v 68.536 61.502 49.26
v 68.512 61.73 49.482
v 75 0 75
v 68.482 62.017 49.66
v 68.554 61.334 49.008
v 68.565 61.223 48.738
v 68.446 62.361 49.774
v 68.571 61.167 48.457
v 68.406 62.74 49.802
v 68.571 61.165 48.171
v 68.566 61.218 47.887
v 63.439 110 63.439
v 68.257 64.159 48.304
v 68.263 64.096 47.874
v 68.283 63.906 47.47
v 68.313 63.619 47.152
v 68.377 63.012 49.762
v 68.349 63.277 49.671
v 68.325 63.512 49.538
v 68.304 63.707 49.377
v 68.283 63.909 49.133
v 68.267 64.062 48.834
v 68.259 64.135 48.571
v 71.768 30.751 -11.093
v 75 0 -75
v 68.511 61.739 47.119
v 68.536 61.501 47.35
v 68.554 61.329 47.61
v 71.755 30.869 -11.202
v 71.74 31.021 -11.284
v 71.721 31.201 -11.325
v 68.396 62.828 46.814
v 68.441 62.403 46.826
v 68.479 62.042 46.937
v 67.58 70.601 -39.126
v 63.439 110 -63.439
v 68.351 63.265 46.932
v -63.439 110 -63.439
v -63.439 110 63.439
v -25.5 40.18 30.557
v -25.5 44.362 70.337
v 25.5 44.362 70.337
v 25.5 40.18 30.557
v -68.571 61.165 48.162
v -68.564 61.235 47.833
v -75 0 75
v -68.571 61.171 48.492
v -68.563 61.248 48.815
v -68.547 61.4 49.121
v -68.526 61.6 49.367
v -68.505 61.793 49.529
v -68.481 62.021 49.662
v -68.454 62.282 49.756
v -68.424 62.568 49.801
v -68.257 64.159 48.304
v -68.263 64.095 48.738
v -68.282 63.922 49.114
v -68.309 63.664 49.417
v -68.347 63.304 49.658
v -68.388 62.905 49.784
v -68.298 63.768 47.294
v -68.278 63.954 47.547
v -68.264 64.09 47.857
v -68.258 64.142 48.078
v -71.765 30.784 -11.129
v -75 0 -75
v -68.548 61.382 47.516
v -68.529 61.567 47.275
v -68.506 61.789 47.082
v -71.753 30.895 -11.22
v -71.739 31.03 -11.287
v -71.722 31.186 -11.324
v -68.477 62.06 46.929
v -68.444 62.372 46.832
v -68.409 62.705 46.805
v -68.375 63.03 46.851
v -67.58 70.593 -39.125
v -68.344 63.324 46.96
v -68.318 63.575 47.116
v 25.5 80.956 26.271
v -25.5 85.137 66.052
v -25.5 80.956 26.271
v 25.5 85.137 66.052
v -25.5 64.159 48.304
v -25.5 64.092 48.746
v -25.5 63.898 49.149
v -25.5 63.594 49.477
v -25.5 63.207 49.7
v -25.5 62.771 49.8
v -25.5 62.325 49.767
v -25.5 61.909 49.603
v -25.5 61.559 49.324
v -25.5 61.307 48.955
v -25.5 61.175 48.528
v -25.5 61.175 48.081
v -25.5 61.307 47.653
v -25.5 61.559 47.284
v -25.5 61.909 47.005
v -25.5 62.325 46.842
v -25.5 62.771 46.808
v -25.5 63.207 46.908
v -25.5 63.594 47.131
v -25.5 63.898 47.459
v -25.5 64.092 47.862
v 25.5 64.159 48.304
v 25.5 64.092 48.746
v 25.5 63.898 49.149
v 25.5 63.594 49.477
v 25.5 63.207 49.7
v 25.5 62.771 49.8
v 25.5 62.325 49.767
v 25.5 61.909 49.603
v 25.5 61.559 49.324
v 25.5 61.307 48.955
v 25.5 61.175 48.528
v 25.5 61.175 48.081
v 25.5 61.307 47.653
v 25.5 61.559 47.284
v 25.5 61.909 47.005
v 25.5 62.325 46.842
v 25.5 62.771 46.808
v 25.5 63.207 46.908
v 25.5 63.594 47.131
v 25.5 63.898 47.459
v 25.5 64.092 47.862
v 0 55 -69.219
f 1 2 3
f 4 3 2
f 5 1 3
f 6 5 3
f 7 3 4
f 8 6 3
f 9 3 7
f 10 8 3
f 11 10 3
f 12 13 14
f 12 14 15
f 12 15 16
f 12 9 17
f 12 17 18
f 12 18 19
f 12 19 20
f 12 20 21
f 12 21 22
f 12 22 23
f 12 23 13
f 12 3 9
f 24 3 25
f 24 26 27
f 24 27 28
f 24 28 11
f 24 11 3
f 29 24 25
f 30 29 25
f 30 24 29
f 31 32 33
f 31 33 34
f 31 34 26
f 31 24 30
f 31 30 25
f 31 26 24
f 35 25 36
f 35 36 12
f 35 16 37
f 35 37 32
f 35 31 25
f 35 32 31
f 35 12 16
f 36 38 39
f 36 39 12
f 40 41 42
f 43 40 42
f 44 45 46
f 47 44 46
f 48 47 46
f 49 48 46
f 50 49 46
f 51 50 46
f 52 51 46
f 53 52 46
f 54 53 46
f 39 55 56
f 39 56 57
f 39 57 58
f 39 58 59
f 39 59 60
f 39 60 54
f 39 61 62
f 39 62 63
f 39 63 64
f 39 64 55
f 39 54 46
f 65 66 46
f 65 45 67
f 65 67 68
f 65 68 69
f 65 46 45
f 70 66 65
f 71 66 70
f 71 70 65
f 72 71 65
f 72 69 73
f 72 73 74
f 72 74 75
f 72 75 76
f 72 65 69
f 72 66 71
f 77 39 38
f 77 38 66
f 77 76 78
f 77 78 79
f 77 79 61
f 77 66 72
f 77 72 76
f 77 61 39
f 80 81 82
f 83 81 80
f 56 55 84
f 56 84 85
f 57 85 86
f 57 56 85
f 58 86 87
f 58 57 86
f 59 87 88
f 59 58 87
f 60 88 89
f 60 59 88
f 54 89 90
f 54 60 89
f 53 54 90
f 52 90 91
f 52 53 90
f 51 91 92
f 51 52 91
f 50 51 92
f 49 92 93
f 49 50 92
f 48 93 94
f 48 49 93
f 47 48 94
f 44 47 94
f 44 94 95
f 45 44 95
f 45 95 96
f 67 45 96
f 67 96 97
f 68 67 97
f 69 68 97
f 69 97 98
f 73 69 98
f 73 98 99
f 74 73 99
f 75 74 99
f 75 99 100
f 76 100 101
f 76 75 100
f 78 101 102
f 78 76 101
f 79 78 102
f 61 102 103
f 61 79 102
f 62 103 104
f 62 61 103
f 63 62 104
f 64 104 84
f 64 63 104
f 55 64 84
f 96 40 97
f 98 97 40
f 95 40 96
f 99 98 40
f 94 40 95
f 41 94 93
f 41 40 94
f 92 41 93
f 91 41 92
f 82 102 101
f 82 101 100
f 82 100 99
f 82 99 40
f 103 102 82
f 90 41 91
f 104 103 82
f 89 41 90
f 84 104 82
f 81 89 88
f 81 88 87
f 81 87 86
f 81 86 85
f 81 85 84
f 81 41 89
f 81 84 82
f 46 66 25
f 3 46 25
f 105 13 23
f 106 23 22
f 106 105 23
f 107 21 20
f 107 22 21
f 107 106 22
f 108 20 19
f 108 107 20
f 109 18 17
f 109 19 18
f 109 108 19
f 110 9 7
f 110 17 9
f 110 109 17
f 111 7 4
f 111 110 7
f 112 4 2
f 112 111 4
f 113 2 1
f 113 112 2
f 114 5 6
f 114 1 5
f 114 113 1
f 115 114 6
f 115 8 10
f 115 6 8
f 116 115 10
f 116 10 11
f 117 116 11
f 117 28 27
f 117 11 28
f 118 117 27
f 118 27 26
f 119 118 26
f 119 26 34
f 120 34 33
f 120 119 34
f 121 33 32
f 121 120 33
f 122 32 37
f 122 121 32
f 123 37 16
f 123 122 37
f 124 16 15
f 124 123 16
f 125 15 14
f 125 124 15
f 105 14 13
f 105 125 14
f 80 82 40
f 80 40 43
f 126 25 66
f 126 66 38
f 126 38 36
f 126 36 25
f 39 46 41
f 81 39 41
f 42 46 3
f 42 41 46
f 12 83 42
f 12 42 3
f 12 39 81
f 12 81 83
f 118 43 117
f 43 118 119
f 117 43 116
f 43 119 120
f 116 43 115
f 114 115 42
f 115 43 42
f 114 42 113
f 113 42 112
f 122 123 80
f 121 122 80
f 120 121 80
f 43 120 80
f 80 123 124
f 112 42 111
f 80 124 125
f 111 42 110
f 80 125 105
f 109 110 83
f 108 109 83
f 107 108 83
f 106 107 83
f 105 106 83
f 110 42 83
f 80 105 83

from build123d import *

# Parameters (mm, degrees)
SKETCH1_W               = 150
SKETCH1_H               = 150
BOSS_EXTRUDE1_DEPTH     = 110
BOSS_EXTRUDE1_TAPER     = 6
SKETCH14_W              = 51
SKETCH14_H              = 41
CUT_EXTRUDE2_DEPTH      = 40
CUT_EXTRUDE3_DEPTH      = 167.809022709
CUT_EXTRUDE3_DEPTH_BACK = 167.809022709
SKETCH23_R              = 1.5


with BuildPart() as part:
    # Sketch1 → Boss-Extrude1 (new body)
    with BuildSketch(Plane(origin=(0, 0, 0), x_dir=(1, 0, 0), z_dir=(0, 1, 0))):
        Rectangle(SKETCH1_W, SKETCH1_H)
    extrude(amount=BOSS_EXTRUDE1_DEPTH, taper=BOSS_EXTRUDE1_TAPER)

    # Sketch14 → Cut-Extrude2 (cut)
    with BuildSketch(Plane(origin=(0, 7.796688406, 74.180535028), x_dir=(1, 0, 0), z_dir=(0, 0.10452846326765353, 0.9945218953682734))):
        with Locations((0, 57.266276007)):
            Rectangle(SKETCH14_W, SKETCH14_H)
    extrude(amount=-CUT_EXTRUDE2_DEPTH, mode=Mode.SUBTRACT)

    # Sketch23 → Cut-Extrude3 (cut, two sides: drawn at the far end of the back side and taken through both)
    with BuildSketch(Plane(origin=(-25.5, 0, 0), x_dir=(0, 0, -1), z_dir=(1, 0, 0)).offset(-CUT_EXTRUDE3_DEPTH_BACK)):
        with Locations(Location((-48.304141292, 62.658684495, 0), (0, 0, 90))):
            Circle(SKETCH23_R)
    extrude(amount=CUT_EXTRUDE3_DEPTH + CUT_EXTRUDE3_DEPTH_BACK, mode=Mode.SUBTRACT)


solid = part.part
